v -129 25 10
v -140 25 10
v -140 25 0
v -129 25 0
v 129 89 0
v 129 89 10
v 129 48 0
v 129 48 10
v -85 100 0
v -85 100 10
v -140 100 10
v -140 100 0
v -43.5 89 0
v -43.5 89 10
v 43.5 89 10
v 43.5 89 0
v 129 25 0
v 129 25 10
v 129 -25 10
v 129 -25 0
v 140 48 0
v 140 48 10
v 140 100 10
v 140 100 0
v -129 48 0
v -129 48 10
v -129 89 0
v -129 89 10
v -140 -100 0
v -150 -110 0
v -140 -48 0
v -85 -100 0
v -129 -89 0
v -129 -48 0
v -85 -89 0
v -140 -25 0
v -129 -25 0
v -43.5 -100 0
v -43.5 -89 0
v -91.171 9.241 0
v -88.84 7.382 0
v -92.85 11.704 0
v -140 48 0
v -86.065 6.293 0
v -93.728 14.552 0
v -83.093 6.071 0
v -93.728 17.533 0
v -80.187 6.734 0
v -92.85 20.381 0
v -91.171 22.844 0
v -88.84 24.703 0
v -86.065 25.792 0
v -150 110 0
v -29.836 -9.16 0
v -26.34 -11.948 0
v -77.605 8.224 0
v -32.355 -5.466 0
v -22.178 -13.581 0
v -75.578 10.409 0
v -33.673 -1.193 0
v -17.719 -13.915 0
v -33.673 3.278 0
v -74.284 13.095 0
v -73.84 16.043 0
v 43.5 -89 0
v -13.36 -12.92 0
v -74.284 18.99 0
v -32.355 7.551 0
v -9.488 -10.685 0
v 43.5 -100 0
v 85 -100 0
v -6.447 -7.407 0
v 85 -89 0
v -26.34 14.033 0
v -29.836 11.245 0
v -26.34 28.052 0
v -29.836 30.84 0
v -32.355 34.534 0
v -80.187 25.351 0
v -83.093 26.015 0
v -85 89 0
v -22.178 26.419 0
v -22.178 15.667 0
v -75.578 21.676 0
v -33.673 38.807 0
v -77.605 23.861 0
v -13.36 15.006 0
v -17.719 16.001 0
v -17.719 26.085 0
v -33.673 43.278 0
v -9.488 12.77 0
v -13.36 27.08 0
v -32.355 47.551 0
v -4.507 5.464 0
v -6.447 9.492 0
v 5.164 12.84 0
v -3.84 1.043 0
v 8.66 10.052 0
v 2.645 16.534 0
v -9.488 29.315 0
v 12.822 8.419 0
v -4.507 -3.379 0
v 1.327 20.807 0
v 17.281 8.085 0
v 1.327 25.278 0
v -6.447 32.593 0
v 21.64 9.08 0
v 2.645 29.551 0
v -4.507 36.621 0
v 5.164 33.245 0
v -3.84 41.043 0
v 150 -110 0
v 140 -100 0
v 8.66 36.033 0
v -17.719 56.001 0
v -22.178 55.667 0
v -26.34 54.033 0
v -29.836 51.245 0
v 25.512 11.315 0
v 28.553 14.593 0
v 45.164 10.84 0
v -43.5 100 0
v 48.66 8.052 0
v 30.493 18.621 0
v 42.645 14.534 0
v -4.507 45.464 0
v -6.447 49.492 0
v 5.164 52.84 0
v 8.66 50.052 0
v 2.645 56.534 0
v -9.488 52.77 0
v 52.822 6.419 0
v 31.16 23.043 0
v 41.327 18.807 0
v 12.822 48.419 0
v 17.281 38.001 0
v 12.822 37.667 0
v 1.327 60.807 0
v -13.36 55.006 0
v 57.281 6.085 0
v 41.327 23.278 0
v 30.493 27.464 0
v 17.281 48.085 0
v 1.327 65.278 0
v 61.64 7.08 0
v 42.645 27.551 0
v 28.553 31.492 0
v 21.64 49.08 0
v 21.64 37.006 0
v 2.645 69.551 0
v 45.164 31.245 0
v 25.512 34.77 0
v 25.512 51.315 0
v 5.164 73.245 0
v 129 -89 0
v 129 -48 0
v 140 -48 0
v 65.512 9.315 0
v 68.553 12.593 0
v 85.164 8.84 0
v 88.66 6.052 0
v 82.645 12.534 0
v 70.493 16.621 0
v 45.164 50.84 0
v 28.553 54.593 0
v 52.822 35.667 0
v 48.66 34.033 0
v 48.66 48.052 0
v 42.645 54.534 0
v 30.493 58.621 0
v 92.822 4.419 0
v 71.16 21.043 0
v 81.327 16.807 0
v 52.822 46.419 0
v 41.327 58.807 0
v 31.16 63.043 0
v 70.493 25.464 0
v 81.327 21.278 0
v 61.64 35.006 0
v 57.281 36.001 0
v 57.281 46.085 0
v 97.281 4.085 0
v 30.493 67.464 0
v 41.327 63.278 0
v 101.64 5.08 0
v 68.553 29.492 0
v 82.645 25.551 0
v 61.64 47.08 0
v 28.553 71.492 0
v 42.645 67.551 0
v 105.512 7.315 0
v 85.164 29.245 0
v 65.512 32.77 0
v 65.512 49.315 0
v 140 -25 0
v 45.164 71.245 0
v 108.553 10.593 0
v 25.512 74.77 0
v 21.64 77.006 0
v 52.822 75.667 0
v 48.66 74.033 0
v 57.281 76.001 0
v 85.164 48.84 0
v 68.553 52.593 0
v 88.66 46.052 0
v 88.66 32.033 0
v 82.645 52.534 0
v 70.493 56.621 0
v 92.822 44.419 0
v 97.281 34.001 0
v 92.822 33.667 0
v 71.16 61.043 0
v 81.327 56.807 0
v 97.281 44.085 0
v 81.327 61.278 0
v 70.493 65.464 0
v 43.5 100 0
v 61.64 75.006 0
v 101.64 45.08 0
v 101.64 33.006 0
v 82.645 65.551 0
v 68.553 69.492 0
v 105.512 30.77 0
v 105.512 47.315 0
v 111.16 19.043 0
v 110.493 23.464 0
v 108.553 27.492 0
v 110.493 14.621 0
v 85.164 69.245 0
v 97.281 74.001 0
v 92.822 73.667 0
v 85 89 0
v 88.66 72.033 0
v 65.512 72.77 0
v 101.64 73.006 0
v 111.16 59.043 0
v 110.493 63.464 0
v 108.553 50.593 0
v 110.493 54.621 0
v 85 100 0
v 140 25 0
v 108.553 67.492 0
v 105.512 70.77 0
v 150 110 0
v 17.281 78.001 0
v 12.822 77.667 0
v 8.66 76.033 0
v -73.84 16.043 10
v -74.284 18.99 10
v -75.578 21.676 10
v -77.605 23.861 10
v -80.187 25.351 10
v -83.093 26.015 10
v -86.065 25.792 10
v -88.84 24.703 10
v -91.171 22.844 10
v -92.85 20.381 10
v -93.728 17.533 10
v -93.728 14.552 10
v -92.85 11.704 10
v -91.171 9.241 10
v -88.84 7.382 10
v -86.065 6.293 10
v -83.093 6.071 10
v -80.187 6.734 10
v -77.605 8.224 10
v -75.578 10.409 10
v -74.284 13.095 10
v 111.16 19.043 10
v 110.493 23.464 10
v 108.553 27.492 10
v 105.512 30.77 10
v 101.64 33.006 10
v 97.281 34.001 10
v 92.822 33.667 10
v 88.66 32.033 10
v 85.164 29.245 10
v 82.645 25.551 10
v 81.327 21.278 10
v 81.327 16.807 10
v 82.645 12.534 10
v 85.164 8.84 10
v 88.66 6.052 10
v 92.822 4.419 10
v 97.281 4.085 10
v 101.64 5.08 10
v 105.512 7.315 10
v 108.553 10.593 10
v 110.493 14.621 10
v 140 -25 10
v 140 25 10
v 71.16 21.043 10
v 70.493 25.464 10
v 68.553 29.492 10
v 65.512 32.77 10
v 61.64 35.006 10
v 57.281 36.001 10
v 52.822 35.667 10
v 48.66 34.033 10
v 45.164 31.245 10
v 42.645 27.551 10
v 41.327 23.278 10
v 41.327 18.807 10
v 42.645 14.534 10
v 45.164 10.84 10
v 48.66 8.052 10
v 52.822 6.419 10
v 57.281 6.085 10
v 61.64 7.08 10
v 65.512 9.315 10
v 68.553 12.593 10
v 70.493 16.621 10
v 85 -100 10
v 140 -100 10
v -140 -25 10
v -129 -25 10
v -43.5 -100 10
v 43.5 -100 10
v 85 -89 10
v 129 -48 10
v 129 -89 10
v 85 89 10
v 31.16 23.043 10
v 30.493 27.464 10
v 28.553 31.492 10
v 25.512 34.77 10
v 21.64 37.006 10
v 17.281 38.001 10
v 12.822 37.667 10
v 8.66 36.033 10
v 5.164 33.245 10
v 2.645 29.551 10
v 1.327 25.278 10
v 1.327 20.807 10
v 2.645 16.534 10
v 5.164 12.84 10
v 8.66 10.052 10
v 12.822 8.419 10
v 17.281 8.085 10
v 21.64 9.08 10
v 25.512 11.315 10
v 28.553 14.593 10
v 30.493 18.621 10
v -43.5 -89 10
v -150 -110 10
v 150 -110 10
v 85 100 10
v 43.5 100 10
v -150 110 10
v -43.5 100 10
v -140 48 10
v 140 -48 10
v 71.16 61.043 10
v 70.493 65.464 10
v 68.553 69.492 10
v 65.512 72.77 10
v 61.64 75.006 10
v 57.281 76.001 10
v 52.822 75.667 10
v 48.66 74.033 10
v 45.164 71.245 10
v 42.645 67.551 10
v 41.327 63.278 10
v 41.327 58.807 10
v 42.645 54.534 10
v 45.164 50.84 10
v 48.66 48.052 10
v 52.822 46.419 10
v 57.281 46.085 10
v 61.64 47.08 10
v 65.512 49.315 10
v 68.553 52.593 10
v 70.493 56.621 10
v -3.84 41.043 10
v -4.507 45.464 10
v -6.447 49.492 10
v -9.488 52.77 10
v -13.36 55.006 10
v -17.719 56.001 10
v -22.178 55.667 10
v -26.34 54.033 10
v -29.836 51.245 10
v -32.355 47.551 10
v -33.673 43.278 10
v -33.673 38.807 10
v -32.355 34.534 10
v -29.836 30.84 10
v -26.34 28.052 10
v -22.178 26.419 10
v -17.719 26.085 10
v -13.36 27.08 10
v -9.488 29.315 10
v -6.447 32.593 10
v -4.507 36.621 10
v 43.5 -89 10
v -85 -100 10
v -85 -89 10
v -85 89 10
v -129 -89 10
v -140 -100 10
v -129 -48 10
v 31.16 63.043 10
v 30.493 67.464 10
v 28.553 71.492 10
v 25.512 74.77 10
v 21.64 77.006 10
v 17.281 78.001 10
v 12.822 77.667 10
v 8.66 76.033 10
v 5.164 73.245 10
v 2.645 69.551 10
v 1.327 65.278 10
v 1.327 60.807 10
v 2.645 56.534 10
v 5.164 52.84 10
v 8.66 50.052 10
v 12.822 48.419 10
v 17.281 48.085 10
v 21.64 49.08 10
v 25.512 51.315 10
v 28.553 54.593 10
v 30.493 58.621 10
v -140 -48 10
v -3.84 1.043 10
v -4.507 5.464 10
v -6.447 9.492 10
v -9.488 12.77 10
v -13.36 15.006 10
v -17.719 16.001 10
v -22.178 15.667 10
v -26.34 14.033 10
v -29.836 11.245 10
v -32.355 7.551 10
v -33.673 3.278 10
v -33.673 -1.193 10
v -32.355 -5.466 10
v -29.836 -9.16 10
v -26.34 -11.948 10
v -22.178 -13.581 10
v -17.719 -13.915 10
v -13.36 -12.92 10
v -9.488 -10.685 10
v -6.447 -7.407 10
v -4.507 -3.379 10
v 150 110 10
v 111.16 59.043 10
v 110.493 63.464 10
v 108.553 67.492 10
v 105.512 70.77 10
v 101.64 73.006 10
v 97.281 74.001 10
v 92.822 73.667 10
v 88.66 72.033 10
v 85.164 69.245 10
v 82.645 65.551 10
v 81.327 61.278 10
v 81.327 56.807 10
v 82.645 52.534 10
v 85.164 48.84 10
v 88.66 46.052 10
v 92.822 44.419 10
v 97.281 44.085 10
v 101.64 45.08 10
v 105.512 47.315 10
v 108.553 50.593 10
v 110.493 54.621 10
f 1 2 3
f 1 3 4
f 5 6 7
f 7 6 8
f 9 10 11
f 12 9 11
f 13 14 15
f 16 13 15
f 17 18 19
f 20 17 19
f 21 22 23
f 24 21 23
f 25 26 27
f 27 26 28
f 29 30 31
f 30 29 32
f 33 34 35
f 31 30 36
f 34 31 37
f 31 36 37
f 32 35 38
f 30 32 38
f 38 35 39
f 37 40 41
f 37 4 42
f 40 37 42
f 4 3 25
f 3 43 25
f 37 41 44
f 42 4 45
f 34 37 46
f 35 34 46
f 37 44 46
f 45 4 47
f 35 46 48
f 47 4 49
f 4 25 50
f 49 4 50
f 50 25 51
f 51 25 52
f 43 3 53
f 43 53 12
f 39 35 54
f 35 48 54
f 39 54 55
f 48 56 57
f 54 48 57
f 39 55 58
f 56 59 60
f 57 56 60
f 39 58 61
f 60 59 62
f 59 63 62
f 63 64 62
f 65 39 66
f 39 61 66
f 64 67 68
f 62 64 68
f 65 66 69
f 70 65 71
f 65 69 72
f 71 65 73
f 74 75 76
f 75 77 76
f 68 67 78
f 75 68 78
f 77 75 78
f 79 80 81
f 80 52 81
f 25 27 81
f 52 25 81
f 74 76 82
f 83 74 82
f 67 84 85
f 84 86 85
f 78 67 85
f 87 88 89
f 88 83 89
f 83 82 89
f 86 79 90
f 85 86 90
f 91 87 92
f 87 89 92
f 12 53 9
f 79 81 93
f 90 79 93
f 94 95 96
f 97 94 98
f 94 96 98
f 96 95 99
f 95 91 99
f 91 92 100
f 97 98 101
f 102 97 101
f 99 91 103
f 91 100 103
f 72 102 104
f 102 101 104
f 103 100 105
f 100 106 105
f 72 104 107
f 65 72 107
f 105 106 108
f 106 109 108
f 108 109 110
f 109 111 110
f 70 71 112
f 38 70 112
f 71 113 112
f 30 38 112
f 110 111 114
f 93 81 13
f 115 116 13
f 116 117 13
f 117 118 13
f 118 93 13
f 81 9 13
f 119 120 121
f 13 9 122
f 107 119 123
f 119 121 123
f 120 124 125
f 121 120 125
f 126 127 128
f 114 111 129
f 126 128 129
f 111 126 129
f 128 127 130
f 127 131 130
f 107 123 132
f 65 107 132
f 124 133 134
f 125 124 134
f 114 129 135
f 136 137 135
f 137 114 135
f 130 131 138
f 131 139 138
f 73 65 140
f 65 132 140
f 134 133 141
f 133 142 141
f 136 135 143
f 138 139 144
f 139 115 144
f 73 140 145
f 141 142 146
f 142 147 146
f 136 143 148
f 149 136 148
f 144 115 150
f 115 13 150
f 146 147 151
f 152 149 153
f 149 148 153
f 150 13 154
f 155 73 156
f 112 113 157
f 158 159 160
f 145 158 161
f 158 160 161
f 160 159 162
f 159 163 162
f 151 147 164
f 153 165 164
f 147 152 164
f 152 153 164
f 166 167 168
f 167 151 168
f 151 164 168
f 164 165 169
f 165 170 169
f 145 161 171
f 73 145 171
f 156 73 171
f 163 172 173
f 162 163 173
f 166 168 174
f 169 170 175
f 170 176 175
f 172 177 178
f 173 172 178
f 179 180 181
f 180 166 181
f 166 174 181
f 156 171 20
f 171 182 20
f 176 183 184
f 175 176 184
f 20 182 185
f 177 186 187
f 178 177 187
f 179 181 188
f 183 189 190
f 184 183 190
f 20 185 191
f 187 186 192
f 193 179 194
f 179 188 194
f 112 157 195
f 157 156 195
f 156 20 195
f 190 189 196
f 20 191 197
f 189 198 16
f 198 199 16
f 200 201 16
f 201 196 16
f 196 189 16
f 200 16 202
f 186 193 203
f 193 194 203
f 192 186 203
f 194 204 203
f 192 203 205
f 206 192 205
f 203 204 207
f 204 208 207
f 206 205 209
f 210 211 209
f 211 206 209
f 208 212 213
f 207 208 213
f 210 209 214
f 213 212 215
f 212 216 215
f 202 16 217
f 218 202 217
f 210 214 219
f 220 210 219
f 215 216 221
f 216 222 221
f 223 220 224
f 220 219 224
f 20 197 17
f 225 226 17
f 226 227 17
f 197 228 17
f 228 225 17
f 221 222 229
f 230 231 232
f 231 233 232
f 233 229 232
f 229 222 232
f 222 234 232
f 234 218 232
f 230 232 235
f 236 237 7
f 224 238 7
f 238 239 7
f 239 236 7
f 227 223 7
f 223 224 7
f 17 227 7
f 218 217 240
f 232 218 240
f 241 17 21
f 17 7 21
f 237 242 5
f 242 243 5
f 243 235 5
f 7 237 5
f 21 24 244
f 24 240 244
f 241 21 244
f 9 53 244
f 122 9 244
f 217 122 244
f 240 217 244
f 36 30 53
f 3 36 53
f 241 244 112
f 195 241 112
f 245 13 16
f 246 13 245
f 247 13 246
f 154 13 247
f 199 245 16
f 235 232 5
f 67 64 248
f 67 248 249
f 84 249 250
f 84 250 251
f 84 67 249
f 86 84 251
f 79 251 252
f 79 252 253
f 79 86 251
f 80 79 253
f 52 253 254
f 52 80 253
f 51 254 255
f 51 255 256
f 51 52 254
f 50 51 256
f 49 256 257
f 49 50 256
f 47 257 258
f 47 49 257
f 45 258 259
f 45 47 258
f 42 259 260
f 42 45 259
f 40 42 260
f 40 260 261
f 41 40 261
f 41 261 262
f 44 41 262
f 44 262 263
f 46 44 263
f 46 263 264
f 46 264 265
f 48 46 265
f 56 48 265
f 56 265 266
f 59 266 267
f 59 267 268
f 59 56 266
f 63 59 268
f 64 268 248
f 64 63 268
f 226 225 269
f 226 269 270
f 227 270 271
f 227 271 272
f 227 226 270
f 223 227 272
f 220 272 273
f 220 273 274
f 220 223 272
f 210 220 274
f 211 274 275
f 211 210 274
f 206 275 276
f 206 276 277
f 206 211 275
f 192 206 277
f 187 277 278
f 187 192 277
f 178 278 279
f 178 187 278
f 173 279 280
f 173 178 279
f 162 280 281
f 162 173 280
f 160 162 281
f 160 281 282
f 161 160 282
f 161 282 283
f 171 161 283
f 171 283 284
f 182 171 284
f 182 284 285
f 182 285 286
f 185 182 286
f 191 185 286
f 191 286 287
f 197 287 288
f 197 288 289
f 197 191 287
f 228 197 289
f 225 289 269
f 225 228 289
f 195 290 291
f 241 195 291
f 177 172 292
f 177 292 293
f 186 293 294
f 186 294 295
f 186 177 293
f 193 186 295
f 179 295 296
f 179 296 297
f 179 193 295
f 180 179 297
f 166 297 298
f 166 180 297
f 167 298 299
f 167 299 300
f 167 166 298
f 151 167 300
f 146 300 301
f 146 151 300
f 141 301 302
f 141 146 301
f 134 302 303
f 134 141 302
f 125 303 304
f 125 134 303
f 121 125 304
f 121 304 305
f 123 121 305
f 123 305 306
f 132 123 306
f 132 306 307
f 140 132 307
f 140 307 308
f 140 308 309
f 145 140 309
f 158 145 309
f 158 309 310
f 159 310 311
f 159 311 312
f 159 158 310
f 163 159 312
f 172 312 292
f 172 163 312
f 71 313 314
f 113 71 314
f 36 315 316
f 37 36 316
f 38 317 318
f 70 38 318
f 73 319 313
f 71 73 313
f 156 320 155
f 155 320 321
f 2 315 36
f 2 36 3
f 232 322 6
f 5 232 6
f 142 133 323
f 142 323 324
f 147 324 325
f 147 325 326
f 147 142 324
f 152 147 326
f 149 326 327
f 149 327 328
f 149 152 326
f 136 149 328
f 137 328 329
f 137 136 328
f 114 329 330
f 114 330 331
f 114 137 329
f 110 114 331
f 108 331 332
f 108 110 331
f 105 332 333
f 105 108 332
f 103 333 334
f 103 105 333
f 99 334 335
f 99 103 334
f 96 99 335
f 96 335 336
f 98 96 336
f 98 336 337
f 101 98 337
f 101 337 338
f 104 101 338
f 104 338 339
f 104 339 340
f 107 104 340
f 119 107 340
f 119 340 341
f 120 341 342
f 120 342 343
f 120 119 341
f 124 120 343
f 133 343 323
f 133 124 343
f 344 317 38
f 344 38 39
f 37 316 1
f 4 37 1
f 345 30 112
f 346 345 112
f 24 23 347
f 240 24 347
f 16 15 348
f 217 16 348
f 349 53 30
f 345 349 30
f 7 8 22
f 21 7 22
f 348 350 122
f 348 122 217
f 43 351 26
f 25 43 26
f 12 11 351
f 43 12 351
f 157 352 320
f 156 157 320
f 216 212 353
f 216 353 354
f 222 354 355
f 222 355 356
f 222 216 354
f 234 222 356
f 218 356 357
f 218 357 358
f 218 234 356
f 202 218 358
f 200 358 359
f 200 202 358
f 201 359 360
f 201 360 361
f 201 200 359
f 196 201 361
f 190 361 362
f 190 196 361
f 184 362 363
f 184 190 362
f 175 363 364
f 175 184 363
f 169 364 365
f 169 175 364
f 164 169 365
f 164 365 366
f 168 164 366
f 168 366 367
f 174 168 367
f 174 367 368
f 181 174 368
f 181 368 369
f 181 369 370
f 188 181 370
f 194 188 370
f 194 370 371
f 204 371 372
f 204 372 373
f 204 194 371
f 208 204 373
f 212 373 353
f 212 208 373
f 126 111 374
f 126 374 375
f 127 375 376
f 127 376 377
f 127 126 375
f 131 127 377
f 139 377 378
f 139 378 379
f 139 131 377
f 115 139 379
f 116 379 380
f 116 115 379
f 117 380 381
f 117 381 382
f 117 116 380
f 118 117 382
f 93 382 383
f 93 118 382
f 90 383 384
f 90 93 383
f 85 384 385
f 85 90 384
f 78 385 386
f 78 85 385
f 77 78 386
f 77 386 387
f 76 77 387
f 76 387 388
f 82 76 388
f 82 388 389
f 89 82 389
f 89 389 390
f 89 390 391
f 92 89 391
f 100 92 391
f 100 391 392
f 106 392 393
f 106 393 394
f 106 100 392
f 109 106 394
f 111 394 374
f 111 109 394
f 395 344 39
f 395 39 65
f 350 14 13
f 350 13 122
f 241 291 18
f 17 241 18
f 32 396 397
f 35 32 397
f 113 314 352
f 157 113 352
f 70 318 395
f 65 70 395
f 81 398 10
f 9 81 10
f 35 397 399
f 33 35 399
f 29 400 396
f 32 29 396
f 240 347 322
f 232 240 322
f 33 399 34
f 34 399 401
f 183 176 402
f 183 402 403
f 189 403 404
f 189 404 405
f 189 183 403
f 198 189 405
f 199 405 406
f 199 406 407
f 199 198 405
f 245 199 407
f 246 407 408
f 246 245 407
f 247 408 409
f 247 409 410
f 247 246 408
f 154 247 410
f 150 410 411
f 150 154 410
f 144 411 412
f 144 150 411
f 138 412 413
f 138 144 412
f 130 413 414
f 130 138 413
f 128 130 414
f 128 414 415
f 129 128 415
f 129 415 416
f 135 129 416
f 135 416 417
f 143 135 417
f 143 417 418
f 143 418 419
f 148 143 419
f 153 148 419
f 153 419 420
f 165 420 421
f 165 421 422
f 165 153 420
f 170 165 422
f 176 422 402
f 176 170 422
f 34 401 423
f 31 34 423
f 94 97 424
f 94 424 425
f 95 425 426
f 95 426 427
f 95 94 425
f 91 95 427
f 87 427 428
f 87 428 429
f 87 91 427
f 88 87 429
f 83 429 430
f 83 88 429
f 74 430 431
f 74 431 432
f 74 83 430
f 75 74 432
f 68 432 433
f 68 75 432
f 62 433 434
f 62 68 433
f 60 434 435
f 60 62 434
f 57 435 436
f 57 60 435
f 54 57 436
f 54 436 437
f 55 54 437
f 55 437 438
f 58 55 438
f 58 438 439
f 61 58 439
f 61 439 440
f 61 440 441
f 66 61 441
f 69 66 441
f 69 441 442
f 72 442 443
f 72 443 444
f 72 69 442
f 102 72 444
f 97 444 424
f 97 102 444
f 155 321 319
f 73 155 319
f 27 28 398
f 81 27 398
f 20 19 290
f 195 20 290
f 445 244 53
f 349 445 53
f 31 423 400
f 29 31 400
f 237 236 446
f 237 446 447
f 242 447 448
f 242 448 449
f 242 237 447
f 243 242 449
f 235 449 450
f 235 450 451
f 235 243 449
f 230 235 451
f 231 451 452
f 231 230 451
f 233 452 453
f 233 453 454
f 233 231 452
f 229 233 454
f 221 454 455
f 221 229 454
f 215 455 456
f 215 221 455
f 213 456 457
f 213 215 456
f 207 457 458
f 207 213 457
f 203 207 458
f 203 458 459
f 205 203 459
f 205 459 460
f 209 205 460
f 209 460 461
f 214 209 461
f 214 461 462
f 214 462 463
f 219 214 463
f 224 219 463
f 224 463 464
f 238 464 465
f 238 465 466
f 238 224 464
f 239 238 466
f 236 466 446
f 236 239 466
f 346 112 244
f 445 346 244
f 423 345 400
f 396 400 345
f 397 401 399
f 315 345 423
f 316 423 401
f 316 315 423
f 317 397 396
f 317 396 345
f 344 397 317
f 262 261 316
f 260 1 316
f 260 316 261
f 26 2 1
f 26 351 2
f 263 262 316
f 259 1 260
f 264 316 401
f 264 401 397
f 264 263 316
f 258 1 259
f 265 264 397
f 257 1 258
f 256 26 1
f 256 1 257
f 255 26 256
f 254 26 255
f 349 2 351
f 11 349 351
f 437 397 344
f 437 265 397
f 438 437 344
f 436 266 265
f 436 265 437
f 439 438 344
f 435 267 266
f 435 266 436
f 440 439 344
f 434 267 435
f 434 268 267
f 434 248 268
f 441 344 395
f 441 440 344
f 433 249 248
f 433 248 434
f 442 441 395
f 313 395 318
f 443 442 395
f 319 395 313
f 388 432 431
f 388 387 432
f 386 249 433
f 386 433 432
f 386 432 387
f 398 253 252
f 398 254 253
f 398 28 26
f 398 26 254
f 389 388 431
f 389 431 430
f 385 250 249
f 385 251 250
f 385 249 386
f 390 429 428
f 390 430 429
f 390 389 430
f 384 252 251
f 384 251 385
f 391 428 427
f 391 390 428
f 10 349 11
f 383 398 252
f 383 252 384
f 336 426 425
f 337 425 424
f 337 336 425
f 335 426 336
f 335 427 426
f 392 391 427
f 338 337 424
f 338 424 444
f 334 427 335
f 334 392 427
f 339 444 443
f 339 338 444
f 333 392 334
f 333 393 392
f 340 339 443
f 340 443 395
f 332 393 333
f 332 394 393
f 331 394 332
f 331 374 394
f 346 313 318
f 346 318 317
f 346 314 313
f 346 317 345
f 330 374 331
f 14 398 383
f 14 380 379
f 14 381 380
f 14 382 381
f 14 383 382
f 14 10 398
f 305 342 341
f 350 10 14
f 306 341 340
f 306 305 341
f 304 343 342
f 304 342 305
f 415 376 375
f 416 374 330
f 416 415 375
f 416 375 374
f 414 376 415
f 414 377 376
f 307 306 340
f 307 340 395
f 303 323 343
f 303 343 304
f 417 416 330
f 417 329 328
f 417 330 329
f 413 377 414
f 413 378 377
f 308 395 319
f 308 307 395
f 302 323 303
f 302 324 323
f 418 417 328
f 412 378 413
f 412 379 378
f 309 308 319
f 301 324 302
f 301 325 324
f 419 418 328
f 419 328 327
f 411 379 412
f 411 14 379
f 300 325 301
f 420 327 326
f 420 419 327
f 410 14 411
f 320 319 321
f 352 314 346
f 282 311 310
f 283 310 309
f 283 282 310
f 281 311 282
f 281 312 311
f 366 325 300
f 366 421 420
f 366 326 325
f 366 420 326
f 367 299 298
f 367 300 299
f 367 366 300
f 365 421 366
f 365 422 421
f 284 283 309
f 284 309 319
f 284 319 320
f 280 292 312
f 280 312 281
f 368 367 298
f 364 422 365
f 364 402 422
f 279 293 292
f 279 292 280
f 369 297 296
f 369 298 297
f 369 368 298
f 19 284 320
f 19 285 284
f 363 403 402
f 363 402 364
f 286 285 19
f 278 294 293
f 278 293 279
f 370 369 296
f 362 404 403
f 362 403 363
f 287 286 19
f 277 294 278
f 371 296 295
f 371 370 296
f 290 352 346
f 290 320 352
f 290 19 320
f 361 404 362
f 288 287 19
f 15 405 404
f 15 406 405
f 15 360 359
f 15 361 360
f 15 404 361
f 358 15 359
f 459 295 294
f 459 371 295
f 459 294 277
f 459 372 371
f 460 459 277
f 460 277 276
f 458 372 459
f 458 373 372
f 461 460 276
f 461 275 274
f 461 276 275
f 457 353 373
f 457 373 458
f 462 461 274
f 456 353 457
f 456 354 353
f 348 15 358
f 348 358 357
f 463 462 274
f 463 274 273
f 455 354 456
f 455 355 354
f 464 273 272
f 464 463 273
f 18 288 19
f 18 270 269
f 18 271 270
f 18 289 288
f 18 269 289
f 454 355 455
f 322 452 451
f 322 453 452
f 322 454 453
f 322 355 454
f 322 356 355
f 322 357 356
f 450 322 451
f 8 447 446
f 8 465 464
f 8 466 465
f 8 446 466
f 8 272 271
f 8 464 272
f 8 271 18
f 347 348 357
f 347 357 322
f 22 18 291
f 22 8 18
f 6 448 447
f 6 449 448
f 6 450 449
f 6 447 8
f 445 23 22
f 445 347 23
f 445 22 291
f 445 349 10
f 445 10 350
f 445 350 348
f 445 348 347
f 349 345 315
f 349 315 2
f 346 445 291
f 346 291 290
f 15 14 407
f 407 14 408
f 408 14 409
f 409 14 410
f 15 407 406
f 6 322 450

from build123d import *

# Parameters (mm, degrees)
F0_R     = 10
F0_R_2   = 15
F1_DEPTH = 10
F3_DEPTH = 10
F4_W     = 87
F4_H     = 11
F5_DEPTH = 10
F6_W     = 11
F6_H     = 50
F7_DEPTH = 10


with BuildPart() as f1:
    # F0 (on Top) → F1 (new body)
    with BuildSketch(Plane.XY):
        Polygon((150, 110), (-150, 110), (-150, -110), (-69, -110), (150, -110), align=None)
        with Locations((-83.840104, 16.042637)):
            Circle(F0_R, mode=Mode.SUBTRACT)
        with Locations((-18.840104, 1.042637)):
            Circle(F0_R_2, mode=Mode.SUBTRACT)
        with Locations((-18.840104, 41.042637)):
            Circle(F0_R_2, mode=Mode.SUBTRACT)
        with Locations((16.159896, 23.042637)):
            Circle(F0_R_2, mode=Mode.SUBTRACT)
        with Locations((56.159896, 21.042637)):
            Circle(F0_R_2, mode=Mode.SUBTRACT)
        with Locations((96.159896, 19.042637)):
            Circle(F0_R_2, mode=Mode.SUBTRACT)
        with Locations((16.159896, 63.042637)):
            Circle(F0_R_2, mode=Mode.SUBTRACT)
        with Locations((56.159896, 61.042637)):
            Circle(F0_R_2, mode=Mode.SUBTRACT)
        with Locations((96.159896, 59.042637)):
            Circle(F0_R_2, mode=Mode.SUBTRACT)
    extrude(amount=F1_DEPTH)

    # F2 (on face) → F3 (cut)
    with BuildSketch(Plane.XY.offset(10)):
        Polygon((140, 48), (140, 100), (85, 100), (85, 89), (129, 89), (129, 48), align=None)
        Polygon((-85, 100), (-140, 100), (-140, 48), (-129, 48), (-129, 89), (-85, 89), align=None)
        Polygon((-140, -48), (-140, -100), (-85, -100), (-85, -89), (-129, -89), (-129, -48), align=None)
        Polygon((85, -100), (140, -100), (140, -48), (129, -48), (129, -89), (85, -89), align=None)
    extrude(amount=-F3_DEPTH, mode=Mode.SUBTRACT)

    # F4 (on face) → F5 (cut)
    with BuildSketch(Plane.XY.offset(10)):
        with Locations((0, 94.5)):
            Rectangle(F4_W, F4_H)
        with Locations((0, -94.5)):
            Rectangle(F4_W, F4_H)
    extrude(amount=-F5_DEPTH, mode=Mode.SUBTRACT)

    # F6 (on face) → F7 (cut)
    with BuildSketch(Plane.XY.offset(10)):
        with Locations((-134.5, 0)):
            Rectangle(F6_W, F6_H)
        Polygon((140, -25), (140, 0), (140, 25), (129, 25), (129, -25), align=None)
    extrude(amount=-F7_DEPTH, mode=Mode.SUBTRACT)


solid = f1.part
